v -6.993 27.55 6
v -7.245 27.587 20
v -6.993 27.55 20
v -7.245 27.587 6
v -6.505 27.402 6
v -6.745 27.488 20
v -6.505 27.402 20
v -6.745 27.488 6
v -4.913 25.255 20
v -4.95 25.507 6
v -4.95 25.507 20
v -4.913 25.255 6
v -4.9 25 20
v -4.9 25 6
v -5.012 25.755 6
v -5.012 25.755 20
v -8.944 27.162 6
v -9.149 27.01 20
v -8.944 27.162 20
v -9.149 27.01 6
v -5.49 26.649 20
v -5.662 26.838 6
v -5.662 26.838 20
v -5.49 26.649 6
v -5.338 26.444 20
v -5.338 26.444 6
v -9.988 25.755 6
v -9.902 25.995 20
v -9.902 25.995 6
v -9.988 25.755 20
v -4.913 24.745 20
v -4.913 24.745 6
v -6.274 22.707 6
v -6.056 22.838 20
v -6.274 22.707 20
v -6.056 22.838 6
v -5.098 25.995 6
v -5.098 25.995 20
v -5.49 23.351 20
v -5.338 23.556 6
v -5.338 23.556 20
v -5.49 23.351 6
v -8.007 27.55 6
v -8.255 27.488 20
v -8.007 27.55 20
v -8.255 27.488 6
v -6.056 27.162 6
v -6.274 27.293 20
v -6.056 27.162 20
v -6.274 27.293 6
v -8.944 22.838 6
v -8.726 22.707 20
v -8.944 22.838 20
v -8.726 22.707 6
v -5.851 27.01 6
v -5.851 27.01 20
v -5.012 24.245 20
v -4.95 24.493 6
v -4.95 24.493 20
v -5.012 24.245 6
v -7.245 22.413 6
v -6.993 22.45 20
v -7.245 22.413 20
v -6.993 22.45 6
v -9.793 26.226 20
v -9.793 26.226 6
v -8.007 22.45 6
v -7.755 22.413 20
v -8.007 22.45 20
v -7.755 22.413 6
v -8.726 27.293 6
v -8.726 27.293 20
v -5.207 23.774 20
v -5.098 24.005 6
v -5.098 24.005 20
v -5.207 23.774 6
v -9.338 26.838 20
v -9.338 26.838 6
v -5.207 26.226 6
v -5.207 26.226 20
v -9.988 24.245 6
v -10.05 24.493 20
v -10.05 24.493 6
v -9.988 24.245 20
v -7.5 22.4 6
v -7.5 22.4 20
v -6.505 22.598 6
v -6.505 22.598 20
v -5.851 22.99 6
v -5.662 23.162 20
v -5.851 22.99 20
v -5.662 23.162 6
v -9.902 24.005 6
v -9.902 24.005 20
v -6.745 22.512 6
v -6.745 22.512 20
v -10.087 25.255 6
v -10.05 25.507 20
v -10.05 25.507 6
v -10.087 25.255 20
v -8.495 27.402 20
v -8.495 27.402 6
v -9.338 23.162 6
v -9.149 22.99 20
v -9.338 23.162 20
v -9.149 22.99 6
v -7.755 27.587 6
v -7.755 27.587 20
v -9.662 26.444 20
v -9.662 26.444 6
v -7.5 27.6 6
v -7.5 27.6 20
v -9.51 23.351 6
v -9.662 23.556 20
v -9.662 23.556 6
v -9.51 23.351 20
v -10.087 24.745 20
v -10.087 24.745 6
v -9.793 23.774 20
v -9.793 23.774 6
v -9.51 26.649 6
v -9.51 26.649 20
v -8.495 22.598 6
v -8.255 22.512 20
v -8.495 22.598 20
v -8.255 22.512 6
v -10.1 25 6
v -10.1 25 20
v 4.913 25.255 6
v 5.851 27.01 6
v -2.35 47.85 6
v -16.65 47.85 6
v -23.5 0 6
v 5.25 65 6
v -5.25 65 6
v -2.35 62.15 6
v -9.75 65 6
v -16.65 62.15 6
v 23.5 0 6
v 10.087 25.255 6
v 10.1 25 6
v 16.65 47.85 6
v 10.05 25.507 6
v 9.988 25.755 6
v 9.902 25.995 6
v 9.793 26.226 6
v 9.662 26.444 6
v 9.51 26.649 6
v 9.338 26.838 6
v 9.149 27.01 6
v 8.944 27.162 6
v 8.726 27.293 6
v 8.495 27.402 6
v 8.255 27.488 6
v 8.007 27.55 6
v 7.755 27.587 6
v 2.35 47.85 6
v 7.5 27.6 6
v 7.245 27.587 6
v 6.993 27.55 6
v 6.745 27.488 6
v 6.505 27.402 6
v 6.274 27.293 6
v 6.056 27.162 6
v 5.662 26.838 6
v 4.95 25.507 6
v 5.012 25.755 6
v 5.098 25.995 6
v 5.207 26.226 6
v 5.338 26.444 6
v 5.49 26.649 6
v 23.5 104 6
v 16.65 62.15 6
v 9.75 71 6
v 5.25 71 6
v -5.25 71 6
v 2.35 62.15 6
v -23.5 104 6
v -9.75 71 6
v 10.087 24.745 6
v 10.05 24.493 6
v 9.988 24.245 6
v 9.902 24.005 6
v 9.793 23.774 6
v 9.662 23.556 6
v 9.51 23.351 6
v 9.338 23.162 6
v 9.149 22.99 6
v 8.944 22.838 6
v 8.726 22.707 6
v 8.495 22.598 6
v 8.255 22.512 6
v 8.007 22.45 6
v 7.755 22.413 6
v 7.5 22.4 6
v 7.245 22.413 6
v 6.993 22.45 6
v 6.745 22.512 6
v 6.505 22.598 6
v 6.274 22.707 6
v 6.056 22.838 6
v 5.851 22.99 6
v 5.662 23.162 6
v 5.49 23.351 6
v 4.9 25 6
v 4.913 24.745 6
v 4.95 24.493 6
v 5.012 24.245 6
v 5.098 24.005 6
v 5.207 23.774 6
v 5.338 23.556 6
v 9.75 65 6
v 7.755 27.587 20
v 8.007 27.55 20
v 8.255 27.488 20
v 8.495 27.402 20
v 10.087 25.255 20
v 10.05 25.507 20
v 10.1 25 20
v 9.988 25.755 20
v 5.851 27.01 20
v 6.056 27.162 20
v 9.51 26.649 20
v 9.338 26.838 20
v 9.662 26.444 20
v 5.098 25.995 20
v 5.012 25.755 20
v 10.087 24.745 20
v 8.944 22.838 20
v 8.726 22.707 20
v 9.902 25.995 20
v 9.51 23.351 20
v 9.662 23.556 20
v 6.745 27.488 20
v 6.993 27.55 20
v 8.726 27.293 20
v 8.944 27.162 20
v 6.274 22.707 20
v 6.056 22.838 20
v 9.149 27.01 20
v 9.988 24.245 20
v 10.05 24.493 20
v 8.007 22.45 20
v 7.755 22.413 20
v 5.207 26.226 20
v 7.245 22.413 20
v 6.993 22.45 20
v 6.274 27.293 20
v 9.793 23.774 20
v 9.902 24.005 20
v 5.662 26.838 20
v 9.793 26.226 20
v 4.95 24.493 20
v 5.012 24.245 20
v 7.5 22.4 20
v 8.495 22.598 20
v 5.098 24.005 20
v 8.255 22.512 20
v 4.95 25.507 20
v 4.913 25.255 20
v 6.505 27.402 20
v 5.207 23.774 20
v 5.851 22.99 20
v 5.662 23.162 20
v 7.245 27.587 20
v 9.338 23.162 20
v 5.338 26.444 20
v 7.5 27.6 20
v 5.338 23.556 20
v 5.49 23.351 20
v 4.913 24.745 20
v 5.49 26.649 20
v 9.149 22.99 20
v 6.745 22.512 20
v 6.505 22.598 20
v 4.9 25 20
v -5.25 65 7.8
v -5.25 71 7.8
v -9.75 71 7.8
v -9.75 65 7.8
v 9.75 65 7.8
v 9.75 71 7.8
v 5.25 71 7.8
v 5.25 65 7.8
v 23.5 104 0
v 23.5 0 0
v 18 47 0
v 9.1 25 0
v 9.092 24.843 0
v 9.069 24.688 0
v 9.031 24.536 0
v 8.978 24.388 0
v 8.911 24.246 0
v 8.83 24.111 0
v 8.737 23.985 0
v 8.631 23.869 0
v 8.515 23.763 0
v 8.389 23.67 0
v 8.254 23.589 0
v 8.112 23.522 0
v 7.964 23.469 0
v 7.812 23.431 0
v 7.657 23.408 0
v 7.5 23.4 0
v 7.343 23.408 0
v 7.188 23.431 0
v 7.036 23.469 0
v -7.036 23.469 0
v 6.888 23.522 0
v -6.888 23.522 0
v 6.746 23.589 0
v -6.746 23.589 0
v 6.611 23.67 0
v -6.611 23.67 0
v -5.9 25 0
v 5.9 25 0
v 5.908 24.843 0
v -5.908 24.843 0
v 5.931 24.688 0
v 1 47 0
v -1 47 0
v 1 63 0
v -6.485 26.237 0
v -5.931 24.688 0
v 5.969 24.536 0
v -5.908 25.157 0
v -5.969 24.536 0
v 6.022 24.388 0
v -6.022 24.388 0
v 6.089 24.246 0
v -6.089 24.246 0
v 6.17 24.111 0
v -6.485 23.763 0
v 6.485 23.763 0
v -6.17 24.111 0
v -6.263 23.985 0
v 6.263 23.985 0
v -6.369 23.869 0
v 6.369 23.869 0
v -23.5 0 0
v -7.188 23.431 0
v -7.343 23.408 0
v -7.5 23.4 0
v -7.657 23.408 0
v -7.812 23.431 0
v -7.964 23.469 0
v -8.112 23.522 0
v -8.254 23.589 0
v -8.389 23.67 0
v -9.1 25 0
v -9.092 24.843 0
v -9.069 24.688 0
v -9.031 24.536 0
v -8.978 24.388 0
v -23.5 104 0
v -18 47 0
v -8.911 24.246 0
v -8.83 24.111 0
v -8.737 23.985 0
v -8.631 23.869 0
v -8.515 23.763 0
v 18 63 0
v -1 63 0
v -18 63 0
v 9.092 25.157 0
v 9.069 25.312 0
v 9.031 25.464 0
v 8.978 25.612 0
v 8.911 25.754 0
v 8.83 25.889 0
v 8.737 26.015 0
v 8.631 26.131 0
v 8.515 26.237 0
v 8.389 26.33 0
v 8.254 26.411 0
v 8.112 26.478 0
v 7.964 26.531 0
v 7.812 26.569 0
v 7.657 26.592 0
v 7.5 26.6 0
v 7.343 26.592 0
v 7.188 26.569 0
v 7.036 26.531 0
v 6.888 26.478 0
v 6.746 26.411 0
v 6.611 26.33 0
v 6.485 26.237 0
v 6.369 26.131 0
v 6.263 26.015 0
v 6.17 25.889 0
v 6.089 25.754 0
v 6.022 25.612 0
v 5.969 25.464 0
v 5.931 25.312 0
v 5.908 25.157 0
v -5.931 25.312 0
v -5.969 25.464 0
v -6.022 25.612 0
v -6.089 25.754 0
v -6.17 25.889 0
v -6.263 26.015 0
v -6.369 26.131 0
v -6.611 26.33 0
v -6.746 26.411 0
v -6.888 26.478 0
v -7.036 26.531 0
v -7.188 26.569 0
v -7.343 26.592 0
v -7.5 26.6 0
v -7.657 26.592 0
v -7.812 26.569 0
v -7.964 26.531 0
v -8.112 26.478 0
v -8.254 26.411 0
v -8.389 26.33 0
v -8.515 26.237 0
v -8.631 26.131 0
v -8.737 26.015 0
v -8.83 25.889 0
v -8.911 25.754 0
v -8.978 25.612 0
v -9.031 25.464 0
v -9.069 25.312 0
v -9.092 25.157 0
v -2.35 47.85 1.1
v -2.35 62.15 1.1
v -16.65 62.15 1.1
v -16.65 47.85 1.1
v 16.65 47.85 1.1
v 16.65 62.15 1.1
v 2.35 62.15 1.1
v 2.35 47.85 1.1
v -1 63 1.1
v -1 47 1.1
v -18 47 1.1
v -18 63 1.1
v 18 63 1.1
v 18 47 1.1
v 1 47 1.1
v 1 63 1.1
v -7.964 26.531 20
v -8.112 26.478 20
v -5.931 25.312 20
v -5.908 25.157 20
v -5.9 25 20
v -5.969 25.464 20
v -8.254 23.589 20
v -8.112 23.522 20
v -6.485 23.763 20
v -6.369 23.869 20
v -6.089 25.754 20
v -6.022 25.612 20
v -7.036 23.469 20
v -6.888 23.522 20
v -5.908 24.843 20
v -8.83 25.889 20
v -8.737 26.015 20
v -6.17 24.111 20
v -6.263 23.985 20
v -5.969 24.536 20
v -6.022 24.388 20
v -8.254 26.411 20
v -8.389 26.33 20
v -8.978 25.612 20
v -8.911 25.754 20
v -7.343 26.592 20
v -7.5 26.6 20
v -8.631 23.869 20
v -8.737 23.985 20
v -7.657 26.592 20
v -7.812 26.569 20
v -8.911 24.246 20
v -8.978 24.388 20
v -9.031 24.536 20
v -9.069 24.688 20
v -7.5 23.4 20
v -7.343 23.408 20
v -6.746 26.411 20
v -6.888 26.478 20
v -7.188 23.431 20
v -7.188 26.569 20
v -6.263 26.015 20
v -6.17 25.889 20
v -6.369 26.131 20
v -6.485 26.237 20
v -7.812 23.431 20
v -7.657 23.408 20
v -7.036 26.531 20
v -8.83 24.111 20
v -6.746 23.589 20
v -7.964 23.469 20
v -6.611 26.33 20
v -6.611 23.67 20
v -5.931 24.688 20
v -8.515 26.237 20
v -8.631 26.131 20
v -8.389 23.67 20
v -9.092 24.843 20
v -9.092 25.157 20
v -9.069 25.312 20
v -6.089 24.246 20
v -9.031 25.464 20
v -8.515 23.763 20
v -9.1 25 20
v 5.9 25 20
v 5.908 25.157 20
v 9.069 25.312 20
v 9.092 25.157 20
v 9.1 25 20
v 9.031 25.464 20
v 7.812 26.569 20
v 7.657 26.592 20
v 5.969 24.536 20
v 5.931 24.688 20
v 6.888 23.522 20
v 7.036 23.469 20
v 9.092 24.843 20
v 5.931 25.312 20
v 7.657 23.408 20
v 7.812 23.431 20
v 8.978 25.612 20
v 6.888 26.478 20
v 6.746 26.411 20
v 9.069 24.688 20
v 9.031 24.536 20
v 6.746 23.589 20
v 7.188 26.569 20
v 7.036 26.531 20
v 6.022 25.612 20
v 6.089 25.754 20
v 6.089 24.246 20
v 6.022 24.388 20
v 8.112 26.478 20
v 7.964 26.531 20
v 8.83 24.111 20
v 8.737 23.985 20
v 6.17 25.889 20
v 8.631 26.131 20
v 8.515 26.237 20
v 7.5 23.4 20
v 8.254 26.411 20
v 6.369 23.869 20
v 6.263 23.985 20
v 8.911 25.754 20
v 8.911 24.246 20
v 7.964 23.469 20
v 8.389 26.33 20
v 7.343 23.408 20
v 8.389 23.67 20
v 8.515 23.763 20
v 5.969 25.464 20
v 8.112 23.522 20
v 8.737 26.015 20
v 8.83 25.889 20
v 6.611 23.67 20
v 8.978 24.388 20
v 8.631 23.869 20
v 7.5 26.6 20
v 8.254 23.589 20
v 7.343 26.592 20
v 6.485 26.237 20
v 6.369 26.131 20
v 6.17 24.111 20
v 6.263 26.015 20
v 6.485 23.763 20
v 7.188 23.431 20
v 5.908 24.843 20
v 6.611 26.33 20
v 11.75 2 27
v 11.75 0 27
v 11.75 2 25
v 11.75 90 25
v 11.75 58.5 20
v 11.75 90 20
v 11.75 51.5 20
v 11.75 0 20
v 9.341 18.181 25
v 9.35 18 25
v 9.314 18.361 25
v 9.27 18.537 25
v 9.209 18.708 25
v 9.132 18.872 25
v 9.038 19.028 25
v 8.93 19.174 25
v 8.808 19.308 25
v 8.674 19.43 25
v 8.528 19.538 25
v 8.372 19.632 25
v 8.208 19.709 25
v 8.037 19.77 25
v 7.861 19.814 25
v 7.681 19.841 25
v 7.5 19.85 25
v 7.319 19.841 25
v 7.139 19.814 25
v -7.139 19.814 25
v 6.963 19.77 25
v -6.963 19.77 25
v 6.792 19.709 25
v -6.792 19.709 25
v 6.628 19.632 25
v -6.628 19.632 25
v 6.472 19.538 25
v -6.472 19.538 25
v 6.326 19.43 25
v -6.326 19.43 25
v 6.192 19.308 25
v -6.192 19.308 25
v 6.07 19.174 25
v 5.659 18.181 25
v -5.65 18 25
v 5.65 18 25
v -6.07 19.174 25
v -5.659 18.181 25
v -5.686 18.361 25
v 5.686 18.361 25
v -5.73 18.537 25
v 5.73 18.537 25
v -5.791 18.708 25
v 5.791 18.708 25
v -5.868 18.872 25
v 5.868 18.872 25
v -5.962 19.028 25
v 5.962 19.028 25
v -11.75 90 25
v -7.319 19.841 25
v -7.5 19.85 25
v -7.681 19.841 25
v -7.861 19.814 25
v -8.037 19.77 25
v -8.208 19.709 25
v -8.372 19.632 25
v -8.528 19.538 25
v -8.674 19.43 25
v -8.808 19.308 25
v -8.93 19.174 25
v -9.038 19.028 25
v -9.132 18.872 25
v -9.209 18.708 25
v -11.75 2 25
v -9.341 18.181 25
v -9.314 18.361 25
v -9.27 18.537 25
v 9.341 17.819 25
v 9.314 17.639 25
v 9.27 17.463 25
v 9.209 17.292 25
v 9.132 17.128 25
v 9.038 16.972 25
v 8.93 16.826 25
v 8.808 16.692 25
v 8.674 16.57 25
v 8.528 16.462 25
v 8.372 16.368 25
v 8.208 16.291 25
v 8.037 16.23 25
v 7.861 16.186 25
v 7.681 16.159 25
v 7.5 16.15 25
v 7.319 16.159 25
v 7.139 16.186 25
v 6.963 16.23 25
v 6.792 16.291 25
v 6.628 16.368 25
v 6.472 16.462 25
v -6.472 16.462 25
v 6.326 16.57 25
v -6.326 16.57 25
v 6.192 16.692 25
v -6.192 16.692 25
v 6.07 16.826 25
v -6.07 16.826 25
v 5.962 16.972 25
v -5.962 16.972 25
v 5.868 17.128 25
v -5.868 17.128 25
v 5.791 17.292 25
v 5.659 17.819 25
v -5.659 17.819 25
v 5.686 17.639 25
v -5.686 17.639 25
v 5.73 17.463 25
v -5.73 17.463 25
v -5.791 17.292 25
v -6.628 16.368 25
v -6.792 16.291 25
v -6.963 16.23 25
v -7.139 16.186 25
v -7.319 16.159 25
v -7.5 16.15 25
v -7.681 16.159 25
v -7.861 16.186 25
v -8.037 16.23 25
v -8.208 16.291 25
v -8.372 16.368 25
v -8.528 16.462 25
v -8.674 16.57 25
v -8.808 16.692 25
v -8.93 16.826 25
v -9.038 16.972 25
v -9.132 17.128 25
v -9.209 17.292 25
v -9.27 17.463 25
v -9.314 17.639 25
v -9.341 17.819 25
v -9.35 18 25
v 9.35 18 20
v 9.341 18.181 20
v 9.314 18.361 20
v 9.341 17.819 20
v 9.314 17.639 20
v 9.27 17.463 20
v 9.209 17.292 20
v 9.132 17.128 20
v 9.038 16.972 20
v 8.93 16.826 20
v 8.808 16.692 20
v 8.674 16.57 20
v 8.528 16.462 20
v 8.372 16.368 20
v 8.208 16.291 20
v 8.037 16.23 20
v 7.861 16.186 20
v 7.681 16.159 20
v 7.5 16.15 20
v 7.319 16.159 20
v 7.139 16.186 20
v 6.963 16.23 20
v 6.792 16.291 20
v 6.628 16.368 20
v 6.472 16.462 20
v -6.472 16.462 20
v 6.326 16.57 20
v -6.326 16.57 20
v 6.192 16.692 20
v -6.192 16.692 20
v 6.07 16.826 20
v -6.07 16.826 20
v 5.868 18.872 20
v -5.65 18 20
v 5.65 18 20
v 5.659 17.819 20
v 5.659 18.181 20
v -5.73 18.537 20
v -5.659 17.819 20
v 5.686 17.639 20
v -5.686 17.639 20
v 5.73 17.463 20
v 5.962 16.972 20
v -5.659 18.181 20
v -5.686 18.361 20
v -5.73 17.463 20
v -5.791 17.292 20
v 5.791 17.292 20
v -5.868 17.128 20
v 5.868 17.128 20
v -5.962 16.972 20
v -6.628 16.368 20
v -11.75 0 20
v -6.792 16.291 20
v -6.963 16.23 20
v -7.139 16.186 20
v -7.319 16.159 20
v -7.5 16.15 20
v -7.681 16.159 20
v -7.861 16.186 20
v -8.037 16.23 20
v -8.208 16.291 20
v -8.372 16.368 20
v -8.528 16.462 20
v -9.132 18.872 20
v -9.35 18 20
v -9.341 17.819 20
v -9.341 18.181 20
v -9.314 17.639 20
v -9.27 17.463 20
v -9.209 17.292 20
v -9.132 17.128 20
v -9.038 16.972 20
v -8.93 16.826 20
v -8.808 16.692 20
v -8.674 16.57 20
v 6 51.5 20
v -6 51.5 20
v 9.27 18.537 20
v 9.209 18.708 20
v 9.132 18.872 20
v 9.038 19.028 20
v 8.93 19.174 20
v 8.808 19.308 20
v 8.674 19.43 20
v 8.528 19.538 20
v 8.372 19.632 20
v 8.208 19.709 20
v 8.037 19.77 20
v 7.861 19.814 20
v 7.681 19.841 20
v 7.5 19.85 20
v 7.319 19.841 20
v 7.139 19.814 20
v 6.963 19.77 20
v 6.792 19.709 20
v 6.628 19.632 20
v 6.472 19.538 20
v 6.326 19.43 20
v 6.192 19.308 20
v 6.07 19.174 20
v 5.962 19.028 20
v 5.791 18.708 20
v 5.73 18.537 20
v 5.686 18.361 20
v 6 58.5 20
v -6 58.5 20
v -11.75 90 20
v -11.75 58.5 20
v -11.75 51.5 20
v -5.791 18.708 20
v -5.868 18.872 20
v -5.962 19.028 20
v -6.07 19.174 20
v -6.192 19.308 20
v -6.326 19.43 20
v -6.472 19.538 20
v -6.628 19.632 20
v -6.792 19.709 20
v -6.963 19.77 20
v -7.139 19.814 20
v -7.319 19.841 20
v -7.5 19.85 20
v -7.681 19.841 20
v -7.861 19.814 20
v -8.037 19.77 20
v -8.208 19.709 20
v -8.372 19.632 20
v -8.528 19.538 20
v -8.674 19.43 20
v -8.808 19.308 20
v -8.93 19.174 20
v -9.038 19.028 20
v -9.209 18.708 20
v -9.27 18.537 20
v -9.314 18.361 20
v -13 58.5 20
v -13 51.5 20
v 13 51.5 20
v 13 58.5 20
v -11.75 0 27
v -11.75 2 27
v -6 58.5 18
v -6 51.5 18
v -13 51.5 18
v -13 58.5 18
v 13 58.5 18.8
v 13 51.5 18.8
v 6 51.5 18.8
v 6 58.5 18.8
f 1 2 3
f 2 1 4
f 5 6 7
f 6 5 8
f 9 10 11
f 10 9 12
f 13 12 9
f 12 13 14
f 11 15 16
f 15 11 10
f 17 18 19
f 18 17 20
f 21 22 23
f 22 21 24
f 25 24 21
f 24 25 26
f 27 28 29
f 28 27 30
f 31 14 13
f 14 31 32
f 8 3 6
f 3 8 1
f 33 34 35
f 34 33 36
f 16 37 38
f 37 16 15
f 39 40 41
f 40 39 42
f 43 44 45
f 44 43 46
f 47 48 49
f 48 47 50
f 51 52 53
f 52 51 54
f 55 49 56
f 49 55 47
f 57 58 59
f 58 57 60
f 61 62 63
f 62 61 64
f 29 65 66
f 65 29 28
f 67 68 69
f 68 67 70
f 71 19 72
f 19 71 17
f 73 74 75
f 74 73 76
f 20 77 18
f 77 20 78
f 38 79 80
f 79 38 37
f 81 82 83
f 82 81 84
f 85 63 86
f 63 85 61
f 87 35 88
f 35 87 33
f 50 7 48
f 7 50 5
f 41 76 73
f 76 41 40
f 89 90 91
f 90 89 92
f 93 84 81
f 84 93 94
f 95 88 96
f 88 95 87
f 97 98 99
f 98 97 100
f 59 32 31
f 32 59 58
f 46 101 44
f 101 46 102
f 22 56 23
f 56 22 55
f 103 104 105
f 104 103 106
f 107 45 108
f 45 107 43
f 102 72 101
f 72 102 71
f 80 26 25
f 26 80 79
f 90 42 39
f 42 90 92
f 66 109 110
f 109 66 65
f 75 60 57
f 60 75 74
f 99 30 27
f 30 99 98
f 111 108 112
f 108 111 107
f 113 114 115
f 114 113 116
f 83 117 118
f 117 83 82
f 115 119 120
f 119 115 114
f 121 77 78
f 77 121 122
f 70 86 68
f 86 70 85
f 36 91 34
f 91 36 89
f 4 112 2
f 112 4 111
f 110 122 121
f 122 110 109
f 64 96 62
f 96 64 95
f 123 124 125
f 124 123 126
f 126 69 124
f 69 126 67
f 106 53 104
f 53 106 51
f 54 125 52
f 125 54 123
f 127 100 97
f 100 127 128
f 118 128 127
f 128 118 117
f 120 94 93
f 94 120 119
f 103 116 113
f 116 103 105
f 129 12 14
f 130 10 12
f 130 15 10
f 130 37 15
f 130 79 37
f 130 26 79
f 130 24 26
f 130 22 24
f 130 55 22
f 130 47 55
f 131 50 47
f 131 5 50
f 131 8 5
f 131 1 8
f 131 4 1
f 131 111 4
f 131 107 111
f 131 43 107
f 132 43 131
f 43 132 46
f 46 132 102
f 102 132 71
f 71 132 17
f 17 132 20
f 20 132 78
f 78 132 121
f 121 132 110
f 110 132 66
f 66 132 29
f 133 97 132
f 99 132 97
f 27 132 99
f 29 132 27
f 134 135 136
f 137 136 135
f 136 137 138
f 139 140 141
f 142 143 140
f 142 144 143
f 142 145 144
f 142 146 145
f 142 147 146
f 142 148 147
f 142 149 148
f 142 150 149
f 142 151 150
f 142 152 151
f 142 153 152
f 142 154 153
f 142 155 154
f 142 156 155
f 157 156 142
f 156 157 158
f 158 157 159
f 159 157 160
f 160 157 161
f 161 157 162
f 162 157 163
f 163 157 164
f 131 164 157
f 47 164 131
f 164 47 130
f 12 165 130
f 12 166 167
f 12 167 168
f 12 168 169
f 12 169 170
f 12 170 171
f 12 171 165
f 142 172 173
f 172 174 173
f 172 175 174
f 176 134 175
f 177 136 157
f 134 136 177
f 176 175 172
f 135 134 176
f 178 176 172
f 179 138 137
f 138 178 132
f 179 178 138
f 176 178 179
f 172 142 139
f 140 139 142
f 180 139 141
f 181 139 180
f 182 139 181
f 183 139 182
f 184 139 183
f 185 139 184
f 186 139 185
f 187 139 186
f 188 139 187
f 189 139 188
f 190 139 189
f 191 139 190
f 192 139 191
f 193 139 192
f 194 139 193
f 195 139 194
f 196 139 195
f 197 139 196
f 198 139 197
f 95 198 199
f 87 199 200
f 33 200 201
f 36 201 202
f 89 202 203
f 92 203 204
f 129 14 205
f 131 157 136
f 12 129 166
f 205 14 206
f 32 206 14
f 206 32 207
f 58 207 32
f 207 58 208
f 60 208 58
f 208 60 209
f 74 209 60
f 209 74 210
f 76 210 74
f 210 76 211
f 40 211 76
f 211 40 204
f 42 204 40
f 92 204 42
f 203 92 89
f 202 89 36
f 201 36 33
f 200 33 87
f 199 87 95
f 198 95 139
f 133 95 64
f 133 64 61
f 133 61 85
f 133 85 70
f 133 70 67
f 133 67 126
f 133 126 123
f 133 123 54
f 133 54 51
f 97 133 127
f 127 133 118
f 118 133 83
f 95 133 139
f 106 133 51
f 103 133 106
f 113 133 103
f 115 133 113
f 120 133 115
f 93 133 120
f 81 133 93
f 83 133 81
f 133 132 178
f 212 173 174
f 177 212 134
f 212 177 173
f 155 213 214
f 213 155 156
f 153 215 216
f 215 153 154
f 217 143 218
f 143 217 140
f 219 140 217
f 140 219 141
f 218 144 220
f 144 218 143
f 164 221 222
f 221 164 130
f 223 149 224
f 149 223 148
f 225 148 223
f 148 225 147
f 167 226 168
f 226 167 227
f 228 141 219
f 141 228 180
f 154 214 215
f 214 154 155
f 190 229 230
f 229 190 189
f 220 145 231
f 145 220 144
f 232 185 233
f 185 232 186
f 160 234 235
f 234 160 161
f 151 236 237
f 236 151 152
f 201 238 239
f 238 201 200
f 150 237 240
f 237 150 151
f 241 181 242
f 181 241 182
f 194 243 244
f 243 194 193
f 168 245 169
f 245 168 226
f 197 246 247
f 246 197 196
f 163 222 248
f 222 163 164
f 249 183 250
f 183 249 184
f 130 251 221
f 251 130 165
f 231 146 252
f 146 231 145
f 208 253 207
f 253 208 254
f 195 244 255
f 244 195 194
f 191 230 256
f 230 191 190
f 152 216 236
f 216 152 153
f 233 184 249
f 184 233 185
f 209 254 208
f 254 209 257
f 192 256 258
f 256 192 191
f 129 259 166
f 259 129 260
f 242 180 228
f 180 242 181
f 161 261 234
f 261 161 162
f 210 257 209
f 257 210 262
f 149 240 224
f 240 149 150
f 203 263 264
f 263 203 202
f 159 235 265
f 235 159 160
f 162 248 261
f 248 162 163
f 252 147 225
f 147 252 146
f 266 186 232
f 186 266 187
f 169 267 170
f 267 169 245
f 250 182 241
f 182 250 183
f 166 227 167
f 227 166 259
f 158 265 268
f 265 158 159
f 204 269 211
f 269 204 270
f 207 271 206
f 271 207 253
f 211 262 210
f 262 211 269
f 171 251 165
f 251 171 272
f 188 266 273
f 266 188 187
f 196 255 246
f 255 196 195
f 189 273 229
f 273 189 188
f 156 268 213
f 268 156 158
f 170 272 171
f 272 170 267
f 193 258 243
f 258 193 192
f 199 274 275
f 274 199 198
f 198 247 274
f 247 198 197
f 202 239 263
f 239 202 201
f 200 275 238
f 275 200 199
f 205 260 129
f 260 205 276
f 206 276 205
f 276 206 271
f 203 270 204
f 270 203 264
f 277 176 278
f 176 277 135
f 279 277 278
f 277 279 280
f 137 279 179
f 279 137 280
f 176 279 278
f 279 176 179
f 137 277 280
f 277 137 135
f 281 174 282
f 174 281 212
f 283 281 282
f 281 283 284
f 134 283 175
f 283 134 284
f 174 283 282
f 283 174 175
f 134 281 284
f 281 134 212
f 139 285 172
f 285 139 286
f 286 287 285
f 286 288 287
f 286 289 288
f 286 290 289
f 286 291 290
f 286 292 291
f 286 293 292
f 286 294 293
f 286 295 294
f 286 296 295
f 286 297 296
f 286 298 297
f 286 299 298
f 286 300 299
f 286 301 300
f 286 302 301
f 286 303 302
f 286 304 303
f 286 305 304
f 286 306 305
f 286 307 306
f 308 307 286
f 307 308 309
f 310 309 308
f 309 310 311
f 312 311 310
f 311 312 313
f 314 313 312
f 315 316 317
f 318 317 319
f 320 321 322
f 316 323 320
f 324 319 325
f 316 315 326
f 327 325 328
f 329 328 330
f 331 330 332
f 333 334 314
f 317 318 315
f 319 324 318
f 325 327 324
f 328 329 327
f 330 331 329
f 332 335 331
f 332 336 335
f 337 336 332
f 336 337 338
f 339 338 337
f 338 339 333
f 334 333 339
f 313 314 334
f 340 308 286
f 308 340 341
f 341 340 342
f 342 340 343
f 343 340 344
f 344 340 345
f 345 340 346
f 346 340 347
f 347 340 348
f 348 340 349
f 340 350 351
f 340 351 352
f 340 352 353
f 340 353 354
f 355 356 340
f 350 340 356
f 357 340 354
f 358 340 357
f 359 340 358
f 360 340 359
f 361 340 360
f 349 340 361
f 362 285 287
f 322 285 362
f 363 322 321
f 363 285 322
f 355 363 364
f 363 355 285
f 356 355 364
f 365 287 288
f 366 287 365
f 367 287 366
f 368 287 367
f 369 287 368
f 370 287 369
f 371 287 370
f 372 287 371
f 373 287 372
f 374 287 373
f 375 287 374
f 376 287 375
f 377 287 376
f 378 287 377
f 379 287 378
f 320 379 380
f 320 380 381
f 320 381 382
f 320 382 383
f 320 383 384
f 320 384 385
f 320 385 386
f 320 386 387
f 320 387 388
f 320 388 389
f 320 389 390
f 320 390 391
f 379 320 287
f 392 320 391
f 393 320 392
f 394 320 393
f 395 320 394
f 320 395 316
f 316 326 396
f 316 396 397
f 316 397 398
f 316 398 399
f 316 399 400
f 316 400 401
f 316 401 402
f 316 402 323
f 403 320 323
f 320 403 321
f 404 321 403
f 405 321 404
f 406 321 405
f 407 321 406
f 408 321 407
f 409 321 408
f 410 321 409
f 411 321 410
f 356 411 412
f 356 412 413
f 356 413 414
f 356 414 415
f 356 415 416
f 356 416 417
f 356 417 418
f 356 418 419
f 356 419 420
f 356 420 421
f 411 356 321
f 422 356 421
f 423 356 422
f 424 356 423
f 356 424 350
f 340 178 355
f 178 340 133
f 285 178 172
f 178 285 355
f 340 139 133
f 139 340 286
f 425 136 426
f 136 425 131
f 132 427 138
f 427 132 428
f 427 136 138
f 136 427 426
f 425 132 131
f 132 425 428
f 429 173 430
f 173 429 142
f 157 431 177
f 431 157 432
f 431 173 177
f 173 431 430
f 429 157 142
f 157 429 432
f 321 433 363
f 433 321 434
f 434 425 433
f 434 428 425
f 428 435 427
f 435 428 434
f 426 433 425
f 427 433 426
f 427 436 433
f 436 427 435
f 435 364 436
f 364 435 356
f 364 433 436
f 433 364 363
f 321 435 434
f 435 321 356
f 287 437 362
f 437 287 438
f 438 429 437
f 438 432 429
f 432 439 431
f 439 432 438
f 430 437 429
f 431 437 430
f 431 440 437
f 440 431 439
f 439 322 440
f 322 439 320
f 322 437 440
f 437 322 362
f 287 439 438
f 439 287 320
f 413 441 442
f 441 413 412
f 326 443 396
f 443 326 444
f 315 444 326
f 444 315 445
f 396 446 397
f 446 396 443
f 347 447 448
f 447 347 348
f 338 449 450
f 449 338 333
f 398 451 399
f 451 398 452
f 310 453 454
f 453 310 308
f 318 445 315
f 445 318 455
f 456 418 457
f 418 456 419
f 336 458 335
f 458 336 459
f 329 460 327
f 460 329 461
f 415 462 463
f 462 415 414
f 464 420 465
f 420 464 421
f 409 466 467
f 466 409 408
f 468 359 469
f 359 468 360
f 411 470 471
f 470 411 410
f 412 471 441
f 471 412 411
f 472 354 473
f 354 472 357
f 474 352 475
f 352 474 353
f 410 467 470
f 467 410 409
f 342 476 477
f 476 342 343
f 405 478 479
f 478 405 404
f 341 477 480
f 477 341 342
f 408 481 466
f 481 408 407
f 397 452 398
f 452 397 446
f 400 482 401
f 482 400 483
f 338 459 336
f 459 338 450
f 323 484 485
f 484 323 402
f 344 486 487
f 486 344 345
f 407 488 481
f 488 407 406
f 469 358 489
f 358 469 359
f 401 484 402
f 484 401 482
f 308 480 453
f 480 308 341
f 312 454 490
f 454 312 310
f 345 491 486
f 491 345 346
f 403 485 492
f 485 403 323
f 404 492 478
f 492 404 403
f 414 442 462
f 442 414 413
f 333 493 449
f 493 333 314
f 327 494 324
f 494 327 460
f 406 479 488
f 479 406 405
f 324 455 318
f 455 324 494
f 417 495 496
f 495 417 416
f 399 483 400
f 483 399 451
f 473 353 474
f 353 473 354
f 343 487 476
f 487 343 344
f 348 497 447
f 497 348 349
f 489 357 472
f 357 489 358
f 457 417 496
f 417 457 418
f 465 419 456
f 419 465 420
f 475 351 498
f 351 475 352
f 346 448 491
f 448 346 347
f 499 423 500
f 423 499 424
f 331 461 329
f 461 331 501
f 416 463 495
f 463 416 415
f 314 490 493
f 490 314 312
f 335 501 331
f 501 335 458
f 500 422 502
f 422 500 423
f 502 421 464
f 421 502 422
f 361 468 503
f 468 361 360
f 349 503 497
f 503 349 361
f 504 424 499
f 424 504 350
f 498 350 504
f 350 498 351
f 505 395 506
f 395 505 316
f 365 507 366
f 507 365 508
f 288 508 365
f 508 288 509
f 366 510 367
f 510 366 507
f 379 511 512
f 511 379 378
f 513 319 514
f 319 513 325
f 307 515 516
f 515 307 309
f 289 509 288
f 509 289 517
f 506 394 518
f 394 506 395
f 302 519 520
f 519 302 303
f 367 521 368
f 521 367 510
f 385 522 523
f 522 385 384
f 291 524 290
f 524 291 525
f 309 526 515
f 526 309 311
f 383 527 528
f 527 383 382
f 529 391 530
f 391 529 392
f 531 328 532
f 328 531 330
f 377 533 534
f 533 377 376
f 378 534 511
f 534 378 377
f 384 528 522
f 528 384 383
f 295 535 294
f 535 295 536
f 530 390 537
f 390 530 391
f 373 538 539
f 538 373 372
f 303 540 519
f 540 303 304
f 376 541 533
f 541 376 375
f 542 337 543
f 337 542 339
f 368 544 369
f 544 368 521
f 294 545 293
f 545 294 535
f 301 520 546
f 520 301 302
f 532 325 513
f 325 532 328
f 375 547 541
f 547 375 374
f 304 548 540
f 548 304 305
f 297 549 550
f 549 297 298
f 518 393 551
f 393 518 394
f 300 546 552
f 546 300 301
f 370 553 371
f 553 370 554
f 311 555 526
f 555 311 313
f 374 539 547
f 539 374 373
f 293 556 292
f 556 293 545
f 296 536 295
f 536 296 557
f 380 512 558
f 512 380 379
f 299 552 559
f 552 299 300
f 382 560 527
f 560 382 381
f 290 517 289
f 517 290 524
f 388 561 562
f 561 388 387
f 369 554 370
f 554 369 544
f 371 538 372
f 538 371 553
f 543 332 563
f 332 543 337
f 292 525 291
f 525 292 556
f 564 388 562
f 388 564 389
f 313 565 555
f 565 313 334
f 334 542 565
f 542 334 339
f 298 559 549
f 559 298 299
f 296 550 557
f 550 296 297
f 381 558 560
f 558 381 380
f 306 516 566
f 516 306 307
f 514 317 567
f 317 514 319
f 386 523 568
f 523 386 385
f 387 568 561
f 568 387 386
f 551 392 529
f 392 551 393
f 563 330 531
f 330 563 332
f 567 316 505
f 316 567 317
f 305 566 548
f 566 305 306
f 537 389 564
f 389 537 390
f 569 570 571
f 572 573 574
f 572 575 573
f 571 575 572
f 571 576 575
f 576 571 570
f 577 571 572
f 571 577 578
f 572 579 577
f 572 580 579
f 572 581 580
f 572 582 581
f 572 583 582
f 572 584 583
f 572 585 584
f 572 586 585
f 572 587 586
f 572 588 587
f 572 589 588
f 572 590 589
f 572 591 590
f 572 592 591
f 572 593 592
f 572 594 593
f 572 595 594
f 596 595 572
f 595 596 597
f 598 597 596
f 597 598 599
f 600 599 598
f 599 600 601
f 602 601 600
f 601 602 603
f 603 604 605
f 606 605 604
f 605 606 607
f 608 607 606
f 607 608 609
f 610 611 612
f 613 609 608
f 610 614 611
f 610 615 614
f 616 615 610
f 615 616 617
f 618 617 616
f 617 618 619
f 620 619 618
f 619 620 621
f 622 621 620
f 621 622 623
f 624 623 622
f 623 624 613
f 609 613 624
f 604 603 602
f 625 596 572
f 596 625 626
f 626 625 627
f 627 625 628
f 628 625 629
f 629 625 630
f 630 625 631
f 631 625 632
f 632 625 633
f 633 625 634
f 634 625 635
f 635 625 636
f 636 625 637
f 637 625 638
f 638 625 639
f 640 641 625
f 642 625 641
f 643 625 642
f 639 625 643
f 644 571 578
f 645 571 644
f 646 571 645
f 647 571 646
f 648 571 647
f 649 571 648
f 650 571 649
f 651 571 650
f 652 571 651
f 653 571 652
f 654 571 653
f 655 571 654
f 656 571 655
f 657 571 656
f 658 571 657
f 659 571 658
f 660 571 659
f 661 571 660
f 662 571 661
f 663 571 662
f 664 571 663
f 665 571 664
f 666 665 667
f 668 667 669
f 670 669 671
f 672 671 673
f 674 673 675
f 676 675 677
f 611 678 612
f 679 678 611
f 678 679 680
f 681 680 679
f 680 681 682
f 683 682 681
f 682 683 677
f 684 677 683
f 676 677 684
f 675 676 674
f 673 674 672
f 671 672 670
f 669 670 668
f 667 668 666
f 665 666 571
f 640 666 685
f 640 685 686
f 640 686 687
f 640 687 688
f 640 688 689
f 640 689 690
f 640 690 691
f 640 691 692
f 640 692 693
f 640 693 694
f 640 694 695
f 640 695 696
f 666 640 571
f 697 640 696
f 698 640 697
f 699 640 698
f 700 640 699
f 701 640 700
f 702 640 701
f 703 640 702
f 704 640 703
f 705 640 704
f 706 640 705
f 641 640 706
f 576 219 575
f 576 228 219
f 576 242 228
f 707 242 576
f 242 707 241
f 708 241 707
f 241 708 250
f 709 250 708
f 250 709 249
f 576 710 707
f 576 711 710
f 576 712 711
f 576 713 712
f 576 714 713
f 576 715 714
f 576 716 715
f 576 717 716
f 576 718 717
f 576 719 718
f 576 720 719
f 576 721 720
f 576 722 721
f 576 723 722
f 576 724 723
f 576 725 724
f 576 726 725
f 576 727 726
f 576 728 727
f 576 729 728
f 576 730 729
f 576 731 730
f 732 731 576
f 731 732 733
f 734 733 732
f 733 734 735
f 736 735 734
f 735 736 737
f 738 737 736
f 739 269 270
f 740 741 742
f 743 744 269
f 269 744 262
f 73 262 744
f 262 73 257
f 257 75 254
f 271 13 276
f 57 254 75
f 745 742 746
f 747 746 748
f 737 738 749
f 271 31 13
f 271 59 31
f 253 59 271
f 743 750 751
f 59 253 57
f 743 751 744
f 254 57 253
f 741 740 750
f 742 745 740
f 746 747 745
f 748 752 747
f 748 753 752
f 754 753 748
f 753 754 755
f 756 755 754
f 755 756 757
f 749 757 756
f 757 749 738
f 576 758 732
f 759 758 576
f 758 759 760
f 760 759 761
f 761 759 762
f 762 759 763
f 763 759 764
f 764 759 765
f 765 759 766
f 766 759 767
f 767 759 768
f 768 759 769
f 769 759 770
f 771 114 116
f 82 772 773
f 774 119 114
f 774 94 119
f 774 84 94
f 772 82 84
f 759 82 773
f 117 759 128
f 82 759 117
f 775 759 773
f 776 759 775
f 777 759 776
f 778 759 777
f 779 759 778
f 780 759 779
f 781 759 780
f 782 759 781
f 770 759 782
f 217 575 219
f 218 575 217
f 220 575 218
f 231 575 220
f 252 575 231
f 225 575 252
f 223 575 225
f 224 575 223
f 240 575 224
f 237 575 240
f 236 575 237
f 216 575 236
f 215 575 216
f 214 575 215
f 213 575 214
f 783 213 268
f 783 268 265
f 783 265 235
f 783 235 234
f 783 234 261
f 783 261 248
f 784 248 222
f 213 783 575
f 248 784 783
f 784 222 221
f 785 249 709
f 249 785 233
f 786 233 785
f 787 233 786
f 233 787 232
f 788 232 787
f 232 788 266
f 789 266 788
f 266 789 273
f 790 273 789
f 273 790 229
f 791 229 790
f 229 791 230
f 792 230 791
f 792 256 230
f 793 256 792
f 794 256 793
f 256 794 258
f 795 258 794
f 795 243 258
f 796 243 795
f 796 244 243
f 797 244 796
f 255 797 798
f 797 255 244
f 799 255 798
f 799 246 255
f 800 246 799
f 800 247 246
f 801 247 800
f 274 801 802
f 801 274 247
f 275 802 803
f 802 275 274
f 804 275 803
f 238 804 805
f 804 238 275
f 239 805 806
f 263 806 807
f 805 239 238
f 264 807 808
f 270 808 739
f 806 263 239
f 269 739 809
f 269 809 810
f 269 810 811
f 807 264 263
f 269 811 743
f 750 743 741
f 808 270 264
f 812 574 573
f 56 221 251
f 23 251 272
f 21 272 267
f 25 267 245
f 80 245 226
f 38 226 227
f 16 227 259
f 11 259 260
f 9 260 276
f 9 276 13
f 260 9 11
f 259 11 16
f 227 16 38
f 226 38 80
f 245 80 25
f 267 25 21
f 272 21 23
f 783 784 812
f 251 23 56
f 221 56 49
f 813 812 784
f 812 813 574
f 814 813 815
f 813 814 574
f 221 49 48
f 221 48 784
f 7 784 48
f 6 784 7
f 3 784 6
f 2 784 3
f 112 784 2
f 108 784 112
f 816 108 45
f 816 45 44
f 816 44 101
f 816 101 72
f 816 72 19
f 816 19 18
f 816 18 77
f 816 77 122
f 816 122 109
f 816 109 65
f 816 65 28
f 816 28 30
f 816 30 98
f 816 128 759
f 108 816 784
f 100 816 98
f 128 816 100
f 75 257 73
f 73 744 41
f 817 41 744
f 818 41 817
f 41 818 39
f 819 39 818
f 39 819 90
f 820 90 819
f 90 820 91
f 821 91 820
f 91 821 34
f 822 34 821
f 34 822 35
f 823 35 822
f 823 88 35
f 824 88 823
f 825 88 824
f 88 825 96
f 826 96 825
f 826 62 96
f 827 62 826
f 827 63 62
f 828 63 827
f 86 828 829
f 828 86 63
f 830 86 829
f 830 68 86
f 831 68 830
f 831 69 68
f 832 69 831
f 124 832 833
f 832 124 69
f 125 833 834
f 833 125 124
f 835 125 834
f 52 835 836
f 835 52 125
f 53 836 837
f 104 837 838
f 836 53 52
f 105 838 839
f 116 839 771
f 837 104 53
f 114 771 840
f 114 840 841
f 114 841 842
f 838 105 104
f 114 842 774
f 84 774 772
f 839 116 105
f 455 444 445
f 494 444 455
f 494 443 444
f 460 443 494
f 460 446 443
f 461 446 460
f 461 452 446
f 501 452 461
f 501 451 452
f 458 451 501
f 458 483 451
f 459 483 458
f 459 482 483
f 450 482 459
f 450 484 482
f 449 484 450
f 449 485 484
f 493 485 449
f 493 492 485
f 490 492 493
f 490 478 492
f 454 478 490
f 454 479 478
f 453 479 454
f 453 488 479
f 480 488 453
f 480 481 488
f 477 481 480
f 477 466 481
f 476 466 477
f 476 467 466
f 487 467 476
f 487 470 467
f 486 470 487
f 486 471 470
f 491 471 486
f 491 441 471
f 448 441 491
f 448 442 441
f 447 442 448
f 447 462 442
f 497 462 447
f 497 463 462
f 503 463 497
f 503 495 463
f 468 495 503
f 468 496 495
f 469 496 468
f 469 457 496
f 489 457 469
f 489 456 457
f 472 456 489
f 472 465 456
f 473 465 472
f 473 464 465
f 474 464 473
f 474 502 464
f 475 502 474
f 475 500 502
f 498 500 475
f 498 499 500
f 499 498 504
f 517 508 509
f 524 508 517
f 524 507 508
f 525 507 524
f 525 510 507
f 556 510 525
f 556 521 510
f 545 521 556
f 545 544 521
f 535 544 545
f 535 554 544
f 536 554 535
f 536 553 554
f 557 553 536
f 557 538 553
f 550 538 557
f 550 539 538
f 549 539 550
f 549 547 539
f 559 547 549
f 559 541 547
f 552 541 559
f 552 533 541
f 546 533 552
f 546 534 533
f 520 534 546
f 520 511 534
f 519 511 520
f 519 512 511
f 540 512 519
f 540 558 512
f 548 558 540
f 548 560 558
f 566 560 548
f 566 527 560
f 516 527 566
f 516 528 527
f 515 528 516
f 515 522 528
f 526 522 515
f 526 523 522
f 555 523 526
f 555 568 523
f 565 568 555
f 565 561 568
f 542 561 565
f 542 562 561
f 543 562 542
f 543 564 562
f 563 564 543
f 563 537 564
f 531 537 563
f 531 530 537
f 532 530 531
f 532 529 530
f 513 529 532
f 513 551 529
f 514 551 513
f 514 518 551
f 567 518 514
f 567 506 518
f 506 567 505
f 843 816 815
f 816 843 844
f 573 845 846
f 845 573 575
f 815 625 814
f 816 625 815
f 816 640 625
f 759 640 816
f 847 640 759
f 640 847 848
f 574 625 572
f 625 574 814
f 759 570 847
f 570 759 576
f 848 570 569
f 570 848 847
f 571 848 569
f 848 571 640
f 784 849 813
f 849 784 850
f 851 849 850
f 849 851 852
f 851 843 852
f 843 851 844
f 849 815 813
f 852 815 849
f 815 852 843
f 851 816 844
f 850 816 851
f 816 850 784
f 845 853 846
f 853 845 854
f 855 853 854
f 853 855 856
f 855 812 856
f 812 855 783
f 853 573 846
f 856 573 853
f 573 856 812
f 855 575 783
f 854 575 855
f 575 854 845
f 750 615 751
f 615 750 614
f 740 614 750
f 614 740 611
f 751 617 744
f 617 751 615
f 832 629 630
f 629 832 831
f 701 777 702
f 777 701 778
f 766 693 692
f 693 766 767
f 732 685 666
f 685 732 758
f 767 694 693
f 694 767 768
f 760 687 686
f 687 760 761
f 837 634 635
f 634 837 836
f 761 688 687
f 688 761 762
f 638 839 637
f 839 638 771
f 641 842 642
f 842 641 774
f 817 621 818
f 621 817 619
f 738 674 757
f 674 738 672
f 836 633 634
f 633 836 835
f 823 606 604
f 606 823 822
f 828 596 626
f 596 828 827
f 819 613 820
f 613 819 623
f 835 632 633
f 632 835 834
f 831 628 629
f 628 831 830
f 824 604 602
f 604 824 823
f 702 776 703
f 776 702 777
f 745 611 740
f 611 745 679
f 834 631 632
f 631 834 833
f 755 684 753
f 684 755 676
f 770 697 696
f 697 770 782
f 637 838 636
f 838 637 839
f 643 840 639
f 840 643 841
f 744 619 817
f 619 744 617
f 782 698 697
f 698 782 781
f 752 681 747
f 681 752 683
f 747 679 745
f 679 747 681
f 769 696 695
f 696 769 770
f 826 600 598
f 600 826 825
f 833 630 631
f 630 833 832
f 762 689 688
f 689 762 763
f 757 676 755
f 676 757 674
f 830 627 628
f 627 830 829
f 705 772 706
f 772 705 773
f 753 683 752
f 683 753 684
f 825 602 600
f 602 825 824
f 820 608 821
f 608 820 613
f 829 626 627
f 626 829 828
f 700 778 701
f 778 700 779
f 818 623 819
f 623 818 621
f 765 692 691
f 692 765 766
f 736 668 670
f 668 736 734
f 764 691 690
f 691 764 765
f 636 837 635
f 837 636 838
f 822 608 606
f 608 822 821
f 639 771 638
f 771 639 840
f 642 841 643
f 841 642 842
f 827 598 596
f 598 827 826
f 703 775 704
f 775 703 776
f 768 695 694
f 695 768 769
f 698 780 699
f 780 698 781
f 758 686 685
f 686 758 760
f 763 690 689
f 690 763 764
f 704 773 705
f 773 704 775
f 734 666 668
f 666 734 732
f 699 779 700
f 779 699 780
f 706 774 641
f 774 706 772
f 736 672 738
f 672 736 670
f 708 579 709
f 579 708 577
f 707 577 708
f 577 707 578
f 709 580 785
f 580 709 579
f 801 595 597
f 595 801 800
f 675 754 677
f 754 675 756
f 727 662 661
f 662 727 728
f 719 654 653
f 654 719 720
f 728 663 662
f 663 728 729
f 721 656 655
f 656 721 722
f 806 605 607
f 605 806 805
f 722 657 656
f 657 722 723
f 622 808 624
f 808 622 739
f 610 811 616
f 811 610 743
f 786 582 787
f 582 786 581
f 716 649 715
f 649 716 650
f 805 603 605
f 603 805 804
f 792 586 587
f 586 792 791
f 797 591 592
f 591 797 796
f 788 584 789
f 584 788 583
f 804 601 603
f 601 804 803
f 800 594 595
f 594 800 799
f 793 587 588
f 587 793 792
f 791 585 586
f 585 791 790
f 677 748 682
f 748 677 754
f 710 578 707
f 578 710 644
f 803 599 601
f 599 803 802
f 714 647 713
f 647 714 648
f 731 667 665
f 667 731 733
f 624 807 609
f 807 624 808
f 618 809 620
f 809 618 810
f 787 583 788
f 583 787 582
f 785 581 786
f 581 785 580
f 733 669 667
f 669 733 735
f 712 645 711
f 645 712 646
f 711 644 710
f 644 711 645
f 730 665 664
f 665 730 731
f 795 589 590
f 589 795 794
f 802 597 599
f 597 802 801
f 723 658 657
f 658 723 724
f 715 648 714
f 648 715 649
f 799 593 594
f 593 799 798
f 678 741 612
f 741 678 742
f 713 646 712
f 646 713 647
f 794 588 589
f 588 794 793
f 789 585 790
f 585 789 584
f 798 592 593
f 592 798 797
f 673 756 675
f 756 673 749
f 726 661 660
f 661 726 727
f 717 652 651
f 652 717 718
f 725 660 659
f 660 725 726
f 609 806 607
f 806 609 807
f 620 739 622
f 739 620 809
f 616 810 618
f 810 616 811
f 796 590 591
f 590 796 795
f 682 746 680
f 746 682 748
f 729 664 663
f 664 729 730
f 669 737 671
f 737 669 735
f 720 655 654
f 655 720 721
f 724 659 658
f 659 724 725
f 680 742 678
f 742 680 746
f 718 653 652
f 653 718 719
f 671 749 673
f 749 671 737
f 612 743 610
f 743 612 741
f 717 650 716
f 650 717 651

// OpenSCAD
/*
  1-key MVP (downstroke velocity):
  - 2 MX switches under key
  - Key moves down
  - A pad hits first, B pad hits later (by height difference pad_delta)
  - Measure Δt between A and B switch press events

  Parts:
    key()  : keycap/lever plate with guide holes + two pads (A higher, B lower)
    base() : base plate with M3 guide posts + MX pockets + optional hotswap pockets

  Units: mm
*/

$fn = 64;

// ---------- VIEW ----------
show_key  = true;
show_base = true;
explode_z = 14;   // visual separation between parts

// ---------- KEY PARAMETERS ----------
key_len = 90;
key_w   = 23.5;
key_t   = 5;

travel = 4.2;          // intended down travel (controlled by stops)
pad_size = 7.0;        // pad footprint (square)
padA_h  = 2.0;         // pad height for A (hits earlier)
pad_delta = 0.8;       // B hits later => B pad is LOWER (smaller height)
padB_h  = padA_h - pad_delta;  // must stay > 0

// Guides (M3 screws used as posts)
guide_spacing = 15.0;     // distance between two guides (X axis)
guide_from_front = 18.0;  // guide holes Y position measured from key front
guide_d_nom = 3.0;
guide_hole_clear = 0.35;  // increase if binding
guide_hole_d = guide_d_nom + 2*guide_hole_clear;

// ---------- BASE PARAMETERS ----------
base_margin = 7;
base_t = 6;

// Guide posts (printed pillars with optional through-hole for M3)
post_d = 5.2;
post_h = key_t + travel + 5;
post_hole = true;
post_hole_d = 3.2;

// Switch geometry (MX body pocket - simplified)
mx_body_w = 14.3;     // add clearance
mx_body_h = 14.3;
mx_pocket_depth = 5.2;

// Distance between switch centers (X axis)
// 19 mm is a practical starting point; adjust to fit your housing.
mx_center_spacing = 19.0;

// Where switches sit along Y (from base front). Adjust to place pads under key.
mx_y = base_margin + 48;  // shift back/forward as you like

// Optional hotswap socket pocket (Kailh MX style) - very simplified
hotswap_enable = true;
hotswap_w = 17.0;     // overall pocket width (X)
hotswap_h = 16.0;     // overall pocket height (Y)
hotswap_depth = 2.4;  // how deep pocket under switch area
hotswap_y_offset = 0; // fine shift if needed

// Stops (limit travel so you don't crush switches)
stops_enable = true;
stop_w = 4.5;
stop_l = 6.0;
stop_h = 1.8;
stop_y = mx_y + 10;   // behind switches
stop_x_inset = 2.0;   // how close to key edges

// ---------- ASSEMBLY PREVIEW ----------
if (show_base) base();
if (show_key)  translate([0,0, base_t + explode_z]) key();

// =================== KEY ===================
module key() {
  assert(padB_h > 0, "padB_h must be > 0. Reduce pad_delta or increase padA_h.");

  difference() {
    union() {
      // main plate
      translate([-key_w/2, 0, 0])
        cube([key_w, key_len, key_t], center=false);

      // optional small front lip
      translate([-key_w/2, 0, key_t])
        cube([key_w, 2.0, 2.0], center=false);

      // pads on underside, aligned to switch centers
      // Left = A (earlier), Right = B (later)
      // IMPORTANT: because pads extrude downward (negative Z),
      // a TALLER pad touches the switch sooner during downstroke.
      // => A pad is taller than B pad.
      // A pad
      translate([-mx_center_spacing/2 - pad_size/2, mx_y - pad_size/2, -padA_h])
        cube([pad_size, pad_size, padA_h], center=false);

      // B pad
      translate([ mx_center_spacing/2 - pad_size/2, mx_y - pad_size/2, -padB_h])
        cube([pad_size, pad_size, padB_h], center=false);
    }

    // guide holes (through key)
    for (sx=[-0.5, 0.5]) {
      translate([sx*guide_spacing, guide_from_front, -1])
        cylinder(d=guide_hole_d, h=key_t+2);
    }
  }
}

// =================== BASE ===================
module base() {
  base_len = key_len + base_margin*2;
  base_w   = max(key_w + base_margin*2, mx_center_spacing + base_margin*2 + 14);

  difference() {
    union() {
      // base plate
      translate([-base_w/2, 0, 0])
        cube([base_w, base_len, base_t], center=false);

      // guide posts
      for (sx=[-0.5, 0.5]) {
        translate([sx*guide_spacing, base_margin + guide_from_front, base_t])
          cylinder(d=post_d, h=post_h);
      }

      // travel stops (key should hit these, not over-crush switches)
      if (stops_enable) {
        // Two stops near left/right edges
        translate([-key_w/2 + stop_x_inset, stop_y, base_t])
          cube([stop_w, stop_l, stop_h], center=false);

        translate([ key_w/2 - stop_x_inset - stop_w, stop_y, base_t])
          cube([stop_w, stop_l, stop_h], center=false);
      }
    }

    // MX switch body pockets (simplified square cavities)
    for (sx=[-0.5, 0.5]) {
      translate([sx*mx_center_spacing - mx_body_w/2, mx_y - mx_body_h/2, base_t - mx_pocket_depth])
        cube([mx_body_w, mx_body_h, mx_pocket_depth + 0.3], center=false);
    }

    // Optional hotswap pocket under each switch area (very simplified)
    // This is NOT a perfect datasheet model; it's a practical clearance pocket.
    if (hotswap_enable) {
      for (sx=[-0.5, 0.5]) {
        translate([sx*mx_center_spacing - hotswap_w/2, (mx_y - hotswap_h/2) + hotswap_y_offset, base_t - mx_pocket_depth - hotswap_depth])
          cube([hotswap_w, hotswap_h, hotswap_depth + 0.3], center=false);
      }
    }

    // Guide post through-holes (if using M3 screws)
    if (post_hole) {
      for (sx=[-0.5, 0.5]) {
        translate([sx*guide_spacing, base_margin + guide_from_front, -1])
          cylinder(d=post_hole_d, h=base_t + post_h + 3);
      }
    }
  }

  // (Optional) visualize switch center markers
  // switch_markers();
}

module switch_markers() {
  // purely visual helpers, no cutting
  color([0.2,0.2,0.2,0.25])
  for (sx=[-0.5, 0.5]) {
    translate([sx*mx_center_spacing, mx_y, base_t])
      cylinder(d=6, h=2);
  }
}
